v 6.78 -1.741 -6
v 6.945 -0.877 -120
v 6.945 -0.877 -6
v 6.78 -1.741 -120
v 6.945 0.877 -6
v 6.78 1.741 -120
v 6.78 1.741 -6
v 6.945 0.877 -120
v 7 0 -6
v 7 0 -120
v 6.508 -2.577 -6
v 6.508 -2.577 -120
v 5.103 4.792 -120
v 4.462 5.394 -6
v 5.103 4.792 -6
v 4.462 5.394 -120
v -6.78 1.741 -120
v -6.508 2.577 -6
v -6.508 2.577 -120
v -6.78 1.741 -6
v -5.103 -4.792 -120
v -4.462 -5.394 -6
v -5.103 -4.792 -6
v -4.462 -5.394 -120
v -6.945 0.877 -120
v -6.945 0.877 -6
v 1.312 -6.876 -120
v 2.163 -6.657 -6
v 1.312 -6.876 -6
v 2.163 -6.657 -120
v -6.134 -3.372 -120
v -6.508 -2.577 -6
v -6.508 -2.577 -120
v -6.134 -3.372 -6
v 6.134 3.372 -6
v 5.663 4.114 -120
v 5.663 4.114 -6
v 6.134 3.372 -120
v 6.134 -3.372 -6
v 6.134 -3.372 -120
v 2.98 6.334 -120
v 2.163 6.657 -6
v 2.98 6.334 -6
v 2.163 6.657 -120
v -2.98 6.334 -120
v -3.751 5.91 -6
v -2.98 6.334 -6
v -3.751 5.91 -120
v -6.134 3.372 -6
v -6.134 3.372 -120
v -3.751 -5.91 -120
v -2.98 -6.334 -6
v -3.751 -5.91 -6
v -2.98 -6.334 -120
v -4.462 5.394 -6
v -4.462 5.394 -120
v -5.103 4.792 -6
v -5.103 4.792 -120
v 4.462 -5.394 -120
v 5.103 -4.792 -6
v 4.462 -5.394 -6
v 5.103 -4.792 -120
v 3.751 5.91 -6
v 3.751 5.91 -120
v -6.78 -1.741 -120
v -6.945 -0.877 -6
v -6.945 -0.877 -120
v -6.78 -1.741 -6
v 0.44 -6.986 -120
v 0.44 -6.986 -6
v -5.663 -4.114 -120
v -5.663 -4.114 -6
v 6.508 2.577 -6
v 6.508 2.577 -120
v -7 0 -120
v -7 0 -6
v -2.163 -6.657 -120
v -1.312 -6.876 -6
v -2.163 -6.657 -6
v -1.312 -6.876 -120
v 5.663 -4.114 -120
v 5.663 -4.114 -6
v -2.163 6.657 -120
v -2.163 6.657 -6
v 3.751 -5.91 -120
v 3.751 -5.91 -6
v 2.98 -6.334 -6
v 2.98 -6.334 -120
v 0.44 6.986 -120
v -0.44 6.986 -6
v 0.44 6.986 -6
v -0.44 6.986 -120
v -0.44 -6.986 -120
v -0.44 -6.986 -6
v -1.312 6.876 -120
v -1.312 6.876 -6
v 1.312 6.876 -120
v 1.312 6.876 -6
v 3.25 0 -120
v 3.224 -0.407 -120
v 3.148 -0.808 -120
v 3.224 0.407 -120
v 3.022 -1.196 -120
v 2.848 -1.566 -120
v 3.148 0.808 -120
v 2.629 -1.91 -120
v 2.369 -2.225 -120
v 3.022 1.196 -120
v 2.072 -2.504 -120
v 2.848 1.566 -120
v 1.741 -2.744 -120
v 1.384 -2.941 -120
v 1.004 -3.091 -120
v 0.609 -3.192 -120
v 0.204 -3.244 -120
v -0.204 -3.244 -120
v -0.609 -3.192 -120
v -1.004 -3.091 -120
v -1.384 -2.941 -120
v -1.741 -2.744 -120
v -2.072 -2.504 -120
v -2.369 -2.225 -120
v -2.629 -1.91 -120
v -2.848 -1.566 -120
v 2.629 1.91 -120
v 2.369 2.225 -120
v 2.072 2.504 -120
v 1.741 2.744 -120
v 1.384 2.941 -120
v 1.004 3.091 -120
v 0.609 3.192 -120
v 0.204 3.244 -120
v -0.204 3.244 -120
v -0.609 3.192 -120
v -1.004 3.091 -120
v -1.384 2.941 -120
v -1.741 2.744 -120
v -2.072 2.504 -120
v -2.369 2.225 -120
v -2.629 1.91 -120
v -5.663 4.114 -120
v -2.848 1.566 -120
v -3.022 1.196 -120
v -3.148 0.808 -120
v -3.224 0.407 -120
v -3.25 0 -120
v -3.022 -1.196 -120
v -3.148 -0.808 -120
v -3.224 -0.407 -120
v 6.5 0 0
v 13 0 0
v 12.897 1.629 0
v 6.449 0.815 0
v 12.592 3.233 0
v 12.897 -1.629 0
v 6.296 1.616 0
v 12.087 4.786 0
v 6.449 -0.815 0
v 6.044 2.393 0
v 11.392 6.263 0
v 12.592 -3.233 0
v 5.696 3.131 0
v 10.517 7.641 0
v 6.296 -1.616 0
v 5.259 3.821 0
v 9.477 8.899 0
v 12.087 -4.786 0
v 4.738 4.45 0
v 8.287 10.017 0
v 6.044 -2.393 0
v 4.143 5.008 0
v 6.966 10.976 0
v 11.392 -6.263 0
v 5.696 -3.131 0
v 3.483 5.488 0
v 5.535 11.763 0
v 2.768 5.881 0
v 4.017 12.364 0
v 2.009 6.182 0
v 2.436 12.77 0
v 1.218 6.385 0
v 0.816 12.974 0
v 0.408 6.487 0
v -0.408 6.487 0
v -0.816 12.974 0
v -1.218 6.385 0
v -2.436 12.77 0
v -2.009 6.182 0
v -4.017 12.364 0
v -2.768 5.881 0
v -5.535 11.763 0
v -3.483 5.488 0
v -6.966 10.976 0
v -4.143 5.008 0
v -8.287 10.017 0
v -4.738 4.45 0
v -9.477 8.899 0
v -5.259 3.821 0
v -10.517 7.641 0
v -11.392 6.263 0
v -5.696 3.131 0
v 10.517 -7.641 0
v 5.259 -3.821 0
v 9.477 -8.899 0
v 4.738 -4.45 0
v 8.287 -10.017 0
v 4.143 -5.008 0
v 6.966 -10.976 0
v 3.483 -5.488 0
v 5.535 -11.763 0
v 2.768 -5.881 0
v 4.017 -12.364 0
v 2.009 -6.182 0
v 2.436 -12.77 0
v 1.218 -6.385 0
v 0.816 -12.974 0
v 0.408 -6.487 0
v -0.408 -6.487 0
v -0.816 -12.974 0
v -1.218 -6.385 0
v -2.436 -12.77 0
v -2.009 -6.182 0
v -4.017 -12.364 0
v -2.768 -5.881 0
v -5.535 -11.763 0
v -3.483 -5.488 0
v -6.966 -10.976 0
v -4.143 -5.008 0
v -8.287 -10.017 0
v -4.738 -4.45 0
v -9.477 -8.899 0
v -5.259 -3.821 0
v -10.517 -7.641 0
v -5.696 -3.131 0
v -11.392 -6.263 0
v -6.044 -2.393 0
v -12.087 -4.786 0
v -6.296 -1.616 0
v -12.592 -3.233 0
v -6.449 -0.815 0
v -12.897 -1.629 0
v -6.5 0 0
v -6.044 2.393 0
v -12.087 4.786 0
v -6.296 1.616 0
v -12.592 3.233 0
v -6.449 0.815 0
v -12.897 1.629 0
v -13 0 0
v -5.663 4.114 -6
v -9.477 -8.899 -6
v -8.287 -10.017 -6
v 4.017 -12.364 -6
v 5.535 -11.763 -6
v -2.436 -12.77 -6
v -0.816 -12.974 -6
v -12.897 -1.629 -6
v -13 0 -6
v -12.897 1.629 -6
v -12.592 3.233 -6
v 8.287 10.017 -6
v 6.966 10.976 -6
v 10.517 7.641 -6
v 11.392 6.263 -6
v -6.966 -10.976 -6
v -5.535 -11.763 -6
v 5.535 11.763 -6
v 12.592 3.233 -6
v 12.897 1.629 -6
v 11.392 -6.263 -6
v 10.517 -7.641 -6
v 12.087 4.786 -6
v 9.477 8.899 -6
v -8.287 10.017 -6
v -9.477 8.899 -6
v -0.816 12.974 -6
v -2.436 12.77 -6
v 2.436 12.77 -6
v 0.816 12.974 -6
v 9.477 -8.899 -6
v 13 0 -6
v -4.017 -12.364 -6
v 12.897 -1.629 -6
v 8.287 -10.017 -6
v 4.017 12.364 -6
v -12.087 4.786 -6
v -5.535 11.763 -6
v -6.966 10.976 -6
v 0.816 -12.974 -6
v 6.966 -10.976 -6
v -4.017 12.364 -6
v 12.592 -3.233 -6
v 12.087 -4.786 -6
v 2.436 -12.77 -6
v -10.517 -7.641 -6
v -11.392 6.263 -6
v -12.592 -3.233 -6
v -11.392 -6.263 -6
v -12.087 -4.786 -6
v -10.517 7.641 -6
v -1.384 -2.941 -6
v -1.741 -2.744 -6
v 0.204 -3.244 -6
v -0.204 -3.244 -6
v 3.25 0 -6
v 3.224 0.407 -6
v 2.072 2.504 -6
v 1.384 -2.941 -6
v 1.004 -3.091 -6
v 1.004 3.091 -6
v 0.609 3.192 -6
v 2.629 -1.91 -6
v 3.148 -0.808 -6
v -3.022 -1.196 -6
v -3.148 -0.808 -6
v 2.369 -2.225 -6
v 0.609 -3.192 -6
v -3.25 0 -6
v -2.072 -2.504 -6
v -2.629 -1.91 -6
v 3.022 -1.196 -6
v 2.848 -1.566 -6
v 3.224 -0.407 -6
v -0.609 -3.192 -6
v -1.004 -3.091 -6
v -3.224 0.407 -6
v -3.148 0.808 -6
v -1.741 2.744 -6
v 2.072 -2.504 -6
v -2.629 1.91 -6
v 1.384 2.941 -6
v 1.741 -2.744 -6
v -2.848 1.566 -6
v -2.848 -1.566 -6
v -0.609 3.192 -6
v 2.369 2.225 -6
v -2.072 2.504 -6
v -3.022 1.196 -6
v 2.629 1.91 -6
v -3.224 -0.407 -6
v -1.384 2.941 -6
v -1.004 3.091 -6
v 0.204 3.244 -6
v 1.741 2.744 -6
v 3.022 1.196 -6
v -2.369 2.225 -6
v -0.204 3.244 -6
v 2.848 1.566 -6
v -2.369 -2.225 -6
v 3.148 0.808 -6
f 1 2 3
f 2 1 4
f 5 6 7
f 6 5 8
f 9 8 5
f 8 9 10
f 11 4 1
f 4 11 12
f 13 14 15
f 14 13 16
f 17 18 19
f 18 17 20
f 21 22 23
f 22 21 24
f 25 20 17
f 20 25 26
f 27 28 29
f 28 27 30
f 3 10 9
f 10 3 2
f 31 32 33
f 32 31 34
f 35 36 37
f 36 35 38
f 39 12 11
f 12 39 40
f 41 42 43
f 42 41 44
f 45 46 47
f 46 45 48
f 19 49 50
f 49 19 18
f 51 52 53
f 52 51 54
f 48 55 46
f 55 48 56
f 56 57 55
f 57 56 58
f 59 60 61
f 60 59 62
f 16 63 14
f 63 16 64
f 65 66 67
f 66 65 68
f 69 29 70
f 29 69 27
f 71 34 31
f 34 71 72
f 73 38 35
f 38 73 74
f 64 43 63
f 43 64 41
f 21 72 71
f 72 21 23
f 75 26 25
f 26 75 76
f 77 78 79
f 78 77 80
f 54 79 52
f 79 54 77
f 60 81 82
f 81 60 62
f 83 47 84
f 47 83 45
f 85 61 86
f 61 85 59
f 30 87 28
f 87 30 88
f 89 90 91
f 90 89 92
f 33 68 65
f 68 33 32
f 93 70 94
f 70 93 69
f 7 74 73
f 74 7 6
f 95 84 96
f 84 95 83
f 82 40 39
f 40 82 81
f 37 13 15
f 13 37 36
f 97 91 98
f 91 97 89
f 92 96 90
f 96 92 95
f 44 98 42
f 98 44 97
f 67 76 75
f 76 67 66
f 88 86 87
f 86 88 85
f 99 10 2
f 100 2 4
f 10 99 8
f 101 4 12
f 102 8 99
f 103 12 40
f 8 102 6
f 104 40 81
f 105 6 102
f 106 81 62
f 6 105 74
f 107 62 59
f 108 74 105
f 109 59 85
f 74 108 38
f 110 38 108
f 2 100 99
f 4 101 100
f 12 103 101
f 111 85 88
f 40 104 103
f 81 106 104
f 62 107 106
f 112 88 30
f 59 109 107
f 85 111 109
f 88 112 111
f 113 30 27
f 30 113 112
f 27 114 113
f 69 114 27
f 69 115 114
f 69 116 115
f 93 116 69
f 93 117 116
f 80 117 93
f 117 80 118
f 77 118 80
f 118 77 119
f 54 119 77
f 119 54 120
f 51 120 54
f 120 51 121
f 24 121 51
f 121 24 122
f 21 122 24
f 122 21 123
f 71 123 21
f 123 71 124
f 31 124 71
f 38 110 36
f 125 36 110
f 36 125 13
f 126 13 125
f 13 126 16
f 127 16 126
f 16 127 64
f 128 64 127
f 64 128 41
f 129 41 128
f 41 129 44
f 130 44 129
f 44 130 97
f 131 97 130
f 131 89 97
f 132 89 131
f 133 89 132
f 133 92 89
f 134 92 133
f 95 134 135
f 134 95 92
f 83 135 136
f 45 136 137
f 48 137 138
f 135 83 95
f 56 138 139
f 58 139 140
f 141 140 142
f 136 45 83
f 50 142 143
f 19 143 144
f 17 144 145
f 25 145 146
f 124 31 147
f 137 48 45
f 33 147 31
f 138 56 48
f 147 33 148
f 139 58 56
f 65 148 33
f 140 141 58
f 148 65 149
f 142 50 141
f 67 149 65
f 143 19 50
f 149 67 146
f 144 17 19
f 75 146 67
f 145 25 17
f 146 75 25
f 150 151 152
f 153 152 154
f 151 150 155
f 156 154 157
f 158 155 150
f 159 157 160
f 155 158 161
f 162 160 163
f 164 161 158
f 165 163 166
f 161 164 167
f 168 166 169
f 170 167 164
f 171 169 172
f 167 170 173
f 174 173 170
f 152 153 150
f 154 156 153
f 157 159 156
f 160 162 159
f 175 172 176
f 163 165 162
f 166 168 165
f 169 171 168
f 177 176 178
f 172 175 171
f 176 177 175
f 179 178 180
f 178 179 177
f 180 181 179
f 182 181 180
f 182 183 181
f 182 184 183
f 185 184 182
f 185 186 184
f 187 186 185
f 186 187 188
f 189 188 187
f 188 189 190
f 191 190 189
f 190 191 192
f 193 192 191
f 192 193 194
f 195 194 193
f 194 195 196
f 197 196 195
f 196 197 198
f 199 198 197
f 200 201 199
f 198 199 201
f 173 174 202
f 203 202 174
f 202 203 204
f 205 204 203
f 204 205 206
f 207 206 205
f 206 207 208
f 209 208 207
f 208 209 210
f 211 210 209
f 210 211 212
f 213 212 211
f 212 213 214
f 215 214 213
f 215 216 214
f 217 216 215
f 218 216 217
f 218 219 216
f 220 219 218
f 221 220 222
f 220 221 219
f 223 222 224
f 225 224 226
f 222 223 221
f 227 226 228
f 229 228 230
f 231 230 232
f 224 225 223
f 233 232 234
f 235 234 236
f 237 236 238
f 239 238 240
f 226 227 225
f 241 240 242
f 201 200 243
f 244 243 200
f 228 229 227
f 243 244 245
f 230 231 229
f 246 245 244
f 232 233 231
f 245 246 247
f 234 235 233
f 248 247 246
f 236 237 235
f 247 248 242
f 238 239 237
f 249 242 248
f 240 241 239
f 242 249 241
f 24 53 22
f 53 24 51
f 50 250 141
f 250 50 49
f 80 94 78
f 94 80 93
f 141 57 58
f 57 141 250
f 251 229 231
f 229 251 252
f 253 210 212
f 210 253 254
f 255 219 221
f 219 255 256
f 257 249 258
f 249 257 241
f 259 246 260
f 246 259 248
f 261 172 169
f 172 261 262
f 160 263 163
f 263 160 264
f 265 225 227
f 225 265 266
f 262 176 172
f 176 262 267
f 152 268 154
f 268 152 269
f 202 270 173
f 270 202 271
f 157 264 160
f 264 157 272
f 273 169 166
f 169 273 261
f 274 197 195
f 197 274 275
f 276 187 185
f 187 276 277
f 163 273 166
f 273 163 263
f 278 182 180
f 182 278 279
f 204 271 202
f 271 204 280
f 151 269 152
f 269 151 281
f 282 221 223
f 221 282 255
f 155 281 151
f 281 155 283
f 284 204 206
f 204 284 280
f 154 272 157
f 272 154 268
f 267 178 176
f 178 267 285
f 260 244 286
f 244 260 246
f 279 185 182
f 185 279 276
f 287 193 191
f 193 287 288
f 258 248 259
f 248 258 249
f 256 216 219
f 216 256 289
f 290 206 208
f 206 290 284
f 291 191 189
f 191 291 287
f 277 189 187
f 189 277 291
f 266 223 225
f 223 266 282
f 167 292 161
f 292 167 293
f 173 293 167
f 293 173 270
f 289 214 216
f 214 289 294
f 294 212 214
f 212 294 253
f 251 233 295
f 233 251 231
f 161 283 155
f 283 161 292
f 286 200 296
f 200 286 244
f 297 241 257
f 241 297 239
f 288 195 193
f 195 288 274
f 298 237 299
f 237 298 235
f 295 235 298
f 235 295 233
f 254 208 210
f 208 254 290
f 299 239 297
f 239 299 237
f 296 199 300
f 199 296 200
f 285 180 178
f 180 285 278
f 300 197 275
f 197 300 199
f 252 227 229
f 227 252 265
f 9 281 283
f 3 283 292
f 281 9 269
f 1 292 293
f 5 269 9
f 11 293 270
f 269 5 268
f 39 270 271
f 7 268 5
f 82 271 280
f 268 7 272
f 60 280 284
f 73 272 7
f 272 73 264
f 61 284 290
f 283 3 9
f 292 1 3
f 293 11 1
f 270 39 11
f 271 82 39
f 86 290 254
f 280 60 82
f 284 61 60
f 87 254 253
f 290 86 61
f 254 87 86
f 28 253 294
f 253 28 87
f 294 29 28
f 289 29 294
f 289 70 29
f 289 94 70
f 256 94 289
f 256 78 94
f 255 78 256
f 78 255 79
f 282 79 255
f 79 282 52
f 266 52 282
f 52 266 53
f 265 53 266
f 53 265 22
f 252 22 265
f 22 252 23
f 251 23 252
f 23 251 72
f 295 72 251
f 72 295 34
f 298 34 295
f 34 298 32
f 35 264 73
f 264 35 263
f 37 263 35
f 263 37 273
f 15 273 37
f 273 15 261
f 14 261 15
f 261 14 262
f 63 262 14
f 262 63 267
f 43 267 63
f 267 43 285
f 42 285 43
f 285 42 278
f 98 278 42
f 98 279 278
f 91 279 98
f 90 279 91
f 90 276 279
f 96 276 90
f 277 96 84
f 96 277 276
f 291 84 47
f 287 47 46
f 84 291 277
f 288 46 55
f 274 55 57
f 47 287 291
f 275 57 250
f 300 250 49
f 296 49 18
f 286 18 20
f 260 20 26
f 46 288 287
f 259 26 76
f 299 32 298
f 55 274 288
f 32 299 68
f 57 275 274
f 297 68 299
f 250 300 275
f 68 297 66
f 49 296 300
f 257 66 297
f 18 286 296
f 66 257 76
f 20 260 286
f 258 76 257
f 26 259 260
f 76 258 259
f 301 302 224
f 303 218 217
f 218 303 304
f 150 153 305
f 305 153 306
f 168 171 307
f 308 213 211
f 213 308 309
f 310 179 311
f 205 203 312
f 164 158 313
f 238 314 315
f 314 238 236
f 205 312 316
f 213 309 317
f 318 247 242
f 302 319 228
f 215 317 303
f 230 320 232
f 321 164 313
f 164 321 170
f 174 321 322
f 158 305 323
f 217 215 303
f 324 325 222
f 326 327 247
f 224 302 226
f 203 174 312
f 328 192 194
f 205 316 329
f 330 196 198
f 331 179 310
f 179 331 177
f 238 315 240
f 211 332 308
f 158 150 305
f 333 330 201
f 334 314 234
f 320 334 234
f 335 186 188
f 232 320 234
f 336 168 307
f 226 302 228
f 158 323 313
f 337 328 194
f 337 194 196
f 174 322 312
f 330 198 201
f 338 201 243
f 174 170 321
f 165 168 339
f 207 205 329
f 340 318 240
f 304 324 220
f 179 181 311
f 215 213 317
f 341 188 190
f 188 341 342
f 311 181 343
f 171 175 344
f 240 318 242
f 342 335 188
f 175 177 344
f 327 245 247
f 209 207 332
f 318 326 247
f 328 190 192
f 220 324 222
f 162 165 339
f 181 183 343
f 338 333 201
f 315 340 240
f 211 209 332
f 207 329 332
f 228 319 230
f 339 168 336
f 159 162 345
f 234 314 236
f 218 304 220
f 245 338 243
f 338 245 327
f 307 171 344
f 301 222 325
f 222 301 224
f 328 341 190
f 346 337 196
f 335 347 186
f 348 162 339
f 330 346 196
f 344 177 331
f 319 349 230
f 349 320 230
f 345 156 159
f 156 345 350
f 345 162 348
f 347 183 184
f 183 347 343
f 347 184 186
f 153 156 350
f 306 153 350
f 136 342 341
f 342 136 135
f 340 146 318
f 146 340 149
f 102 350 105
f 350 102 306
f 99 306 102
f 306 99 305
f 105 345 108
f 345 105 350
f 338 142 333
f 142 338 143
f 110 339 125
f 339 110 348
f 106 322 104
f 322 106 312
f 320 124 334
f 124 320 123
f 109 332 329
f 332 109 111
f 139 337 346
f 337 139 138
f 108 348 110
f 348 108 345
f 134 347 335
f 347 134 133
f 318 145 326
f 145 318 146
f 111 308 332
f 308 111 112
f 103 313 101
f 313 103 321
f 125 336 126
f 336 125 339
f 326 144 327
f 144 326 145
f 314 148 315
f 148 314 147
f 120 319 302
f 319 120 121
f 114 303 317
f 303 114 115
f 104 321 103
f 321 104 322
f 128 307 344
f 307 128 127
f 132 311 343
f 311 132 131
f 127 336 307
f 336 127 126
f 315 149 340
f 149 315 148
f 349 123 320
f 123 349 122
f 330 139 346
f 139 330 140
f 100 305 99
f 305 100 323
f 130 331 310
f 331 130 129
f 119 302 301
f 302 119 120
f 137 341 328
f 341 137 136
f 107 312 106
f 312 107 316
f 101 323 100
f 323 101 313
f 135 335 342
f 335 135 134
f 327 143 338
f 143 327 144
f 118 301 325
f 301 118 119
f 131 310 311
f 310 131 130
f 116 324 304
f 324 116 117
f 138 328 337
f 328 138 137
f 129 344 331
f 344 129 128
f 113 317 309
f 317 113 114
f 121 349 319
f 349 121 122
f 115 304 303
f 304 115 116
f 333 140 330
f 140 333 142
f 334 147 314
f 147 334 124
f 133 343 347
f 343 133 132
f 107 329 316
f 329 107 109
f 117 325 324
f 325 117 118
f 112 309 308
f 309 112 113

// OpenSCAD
$fn = 50;


difference() {
	union() {
		translate(v = [0, 0, -120.0000000000]) {
			cylinder(h = 120, r = 7.0000000000);
		}
		translate(v = [0, 0, -6.0000000000]) {
			cylinder(h = 6, r = 13.0000000000);
		}
	}
	union() {
		translate(v = [0, 0, 0]) {
			rotate(a = [0, 0, 0]) {
				difference() {
					union() {
						#translate(v = [0, 0, -120.0000000000]) {
							cylinder(h = 120, r = 2.2500000000);
						}
						#translate(v = [0, 0, -6]) {
							cylinder(h = 6, r = 7.0000000000, r1 = 3.2500000000, r2 = 6.5000000000);
						}
						#translate(v = [0, 0, -120.0000000000]) {
							cylinder(h = 120, r = 3.2500000000);
						}
						#translate(v = [0, 0, -120.0000000000]) {
							cylinder(h = 120, r = 2.2500000000);
						}
					}
					union();
				}
			}
		}
	}
}
